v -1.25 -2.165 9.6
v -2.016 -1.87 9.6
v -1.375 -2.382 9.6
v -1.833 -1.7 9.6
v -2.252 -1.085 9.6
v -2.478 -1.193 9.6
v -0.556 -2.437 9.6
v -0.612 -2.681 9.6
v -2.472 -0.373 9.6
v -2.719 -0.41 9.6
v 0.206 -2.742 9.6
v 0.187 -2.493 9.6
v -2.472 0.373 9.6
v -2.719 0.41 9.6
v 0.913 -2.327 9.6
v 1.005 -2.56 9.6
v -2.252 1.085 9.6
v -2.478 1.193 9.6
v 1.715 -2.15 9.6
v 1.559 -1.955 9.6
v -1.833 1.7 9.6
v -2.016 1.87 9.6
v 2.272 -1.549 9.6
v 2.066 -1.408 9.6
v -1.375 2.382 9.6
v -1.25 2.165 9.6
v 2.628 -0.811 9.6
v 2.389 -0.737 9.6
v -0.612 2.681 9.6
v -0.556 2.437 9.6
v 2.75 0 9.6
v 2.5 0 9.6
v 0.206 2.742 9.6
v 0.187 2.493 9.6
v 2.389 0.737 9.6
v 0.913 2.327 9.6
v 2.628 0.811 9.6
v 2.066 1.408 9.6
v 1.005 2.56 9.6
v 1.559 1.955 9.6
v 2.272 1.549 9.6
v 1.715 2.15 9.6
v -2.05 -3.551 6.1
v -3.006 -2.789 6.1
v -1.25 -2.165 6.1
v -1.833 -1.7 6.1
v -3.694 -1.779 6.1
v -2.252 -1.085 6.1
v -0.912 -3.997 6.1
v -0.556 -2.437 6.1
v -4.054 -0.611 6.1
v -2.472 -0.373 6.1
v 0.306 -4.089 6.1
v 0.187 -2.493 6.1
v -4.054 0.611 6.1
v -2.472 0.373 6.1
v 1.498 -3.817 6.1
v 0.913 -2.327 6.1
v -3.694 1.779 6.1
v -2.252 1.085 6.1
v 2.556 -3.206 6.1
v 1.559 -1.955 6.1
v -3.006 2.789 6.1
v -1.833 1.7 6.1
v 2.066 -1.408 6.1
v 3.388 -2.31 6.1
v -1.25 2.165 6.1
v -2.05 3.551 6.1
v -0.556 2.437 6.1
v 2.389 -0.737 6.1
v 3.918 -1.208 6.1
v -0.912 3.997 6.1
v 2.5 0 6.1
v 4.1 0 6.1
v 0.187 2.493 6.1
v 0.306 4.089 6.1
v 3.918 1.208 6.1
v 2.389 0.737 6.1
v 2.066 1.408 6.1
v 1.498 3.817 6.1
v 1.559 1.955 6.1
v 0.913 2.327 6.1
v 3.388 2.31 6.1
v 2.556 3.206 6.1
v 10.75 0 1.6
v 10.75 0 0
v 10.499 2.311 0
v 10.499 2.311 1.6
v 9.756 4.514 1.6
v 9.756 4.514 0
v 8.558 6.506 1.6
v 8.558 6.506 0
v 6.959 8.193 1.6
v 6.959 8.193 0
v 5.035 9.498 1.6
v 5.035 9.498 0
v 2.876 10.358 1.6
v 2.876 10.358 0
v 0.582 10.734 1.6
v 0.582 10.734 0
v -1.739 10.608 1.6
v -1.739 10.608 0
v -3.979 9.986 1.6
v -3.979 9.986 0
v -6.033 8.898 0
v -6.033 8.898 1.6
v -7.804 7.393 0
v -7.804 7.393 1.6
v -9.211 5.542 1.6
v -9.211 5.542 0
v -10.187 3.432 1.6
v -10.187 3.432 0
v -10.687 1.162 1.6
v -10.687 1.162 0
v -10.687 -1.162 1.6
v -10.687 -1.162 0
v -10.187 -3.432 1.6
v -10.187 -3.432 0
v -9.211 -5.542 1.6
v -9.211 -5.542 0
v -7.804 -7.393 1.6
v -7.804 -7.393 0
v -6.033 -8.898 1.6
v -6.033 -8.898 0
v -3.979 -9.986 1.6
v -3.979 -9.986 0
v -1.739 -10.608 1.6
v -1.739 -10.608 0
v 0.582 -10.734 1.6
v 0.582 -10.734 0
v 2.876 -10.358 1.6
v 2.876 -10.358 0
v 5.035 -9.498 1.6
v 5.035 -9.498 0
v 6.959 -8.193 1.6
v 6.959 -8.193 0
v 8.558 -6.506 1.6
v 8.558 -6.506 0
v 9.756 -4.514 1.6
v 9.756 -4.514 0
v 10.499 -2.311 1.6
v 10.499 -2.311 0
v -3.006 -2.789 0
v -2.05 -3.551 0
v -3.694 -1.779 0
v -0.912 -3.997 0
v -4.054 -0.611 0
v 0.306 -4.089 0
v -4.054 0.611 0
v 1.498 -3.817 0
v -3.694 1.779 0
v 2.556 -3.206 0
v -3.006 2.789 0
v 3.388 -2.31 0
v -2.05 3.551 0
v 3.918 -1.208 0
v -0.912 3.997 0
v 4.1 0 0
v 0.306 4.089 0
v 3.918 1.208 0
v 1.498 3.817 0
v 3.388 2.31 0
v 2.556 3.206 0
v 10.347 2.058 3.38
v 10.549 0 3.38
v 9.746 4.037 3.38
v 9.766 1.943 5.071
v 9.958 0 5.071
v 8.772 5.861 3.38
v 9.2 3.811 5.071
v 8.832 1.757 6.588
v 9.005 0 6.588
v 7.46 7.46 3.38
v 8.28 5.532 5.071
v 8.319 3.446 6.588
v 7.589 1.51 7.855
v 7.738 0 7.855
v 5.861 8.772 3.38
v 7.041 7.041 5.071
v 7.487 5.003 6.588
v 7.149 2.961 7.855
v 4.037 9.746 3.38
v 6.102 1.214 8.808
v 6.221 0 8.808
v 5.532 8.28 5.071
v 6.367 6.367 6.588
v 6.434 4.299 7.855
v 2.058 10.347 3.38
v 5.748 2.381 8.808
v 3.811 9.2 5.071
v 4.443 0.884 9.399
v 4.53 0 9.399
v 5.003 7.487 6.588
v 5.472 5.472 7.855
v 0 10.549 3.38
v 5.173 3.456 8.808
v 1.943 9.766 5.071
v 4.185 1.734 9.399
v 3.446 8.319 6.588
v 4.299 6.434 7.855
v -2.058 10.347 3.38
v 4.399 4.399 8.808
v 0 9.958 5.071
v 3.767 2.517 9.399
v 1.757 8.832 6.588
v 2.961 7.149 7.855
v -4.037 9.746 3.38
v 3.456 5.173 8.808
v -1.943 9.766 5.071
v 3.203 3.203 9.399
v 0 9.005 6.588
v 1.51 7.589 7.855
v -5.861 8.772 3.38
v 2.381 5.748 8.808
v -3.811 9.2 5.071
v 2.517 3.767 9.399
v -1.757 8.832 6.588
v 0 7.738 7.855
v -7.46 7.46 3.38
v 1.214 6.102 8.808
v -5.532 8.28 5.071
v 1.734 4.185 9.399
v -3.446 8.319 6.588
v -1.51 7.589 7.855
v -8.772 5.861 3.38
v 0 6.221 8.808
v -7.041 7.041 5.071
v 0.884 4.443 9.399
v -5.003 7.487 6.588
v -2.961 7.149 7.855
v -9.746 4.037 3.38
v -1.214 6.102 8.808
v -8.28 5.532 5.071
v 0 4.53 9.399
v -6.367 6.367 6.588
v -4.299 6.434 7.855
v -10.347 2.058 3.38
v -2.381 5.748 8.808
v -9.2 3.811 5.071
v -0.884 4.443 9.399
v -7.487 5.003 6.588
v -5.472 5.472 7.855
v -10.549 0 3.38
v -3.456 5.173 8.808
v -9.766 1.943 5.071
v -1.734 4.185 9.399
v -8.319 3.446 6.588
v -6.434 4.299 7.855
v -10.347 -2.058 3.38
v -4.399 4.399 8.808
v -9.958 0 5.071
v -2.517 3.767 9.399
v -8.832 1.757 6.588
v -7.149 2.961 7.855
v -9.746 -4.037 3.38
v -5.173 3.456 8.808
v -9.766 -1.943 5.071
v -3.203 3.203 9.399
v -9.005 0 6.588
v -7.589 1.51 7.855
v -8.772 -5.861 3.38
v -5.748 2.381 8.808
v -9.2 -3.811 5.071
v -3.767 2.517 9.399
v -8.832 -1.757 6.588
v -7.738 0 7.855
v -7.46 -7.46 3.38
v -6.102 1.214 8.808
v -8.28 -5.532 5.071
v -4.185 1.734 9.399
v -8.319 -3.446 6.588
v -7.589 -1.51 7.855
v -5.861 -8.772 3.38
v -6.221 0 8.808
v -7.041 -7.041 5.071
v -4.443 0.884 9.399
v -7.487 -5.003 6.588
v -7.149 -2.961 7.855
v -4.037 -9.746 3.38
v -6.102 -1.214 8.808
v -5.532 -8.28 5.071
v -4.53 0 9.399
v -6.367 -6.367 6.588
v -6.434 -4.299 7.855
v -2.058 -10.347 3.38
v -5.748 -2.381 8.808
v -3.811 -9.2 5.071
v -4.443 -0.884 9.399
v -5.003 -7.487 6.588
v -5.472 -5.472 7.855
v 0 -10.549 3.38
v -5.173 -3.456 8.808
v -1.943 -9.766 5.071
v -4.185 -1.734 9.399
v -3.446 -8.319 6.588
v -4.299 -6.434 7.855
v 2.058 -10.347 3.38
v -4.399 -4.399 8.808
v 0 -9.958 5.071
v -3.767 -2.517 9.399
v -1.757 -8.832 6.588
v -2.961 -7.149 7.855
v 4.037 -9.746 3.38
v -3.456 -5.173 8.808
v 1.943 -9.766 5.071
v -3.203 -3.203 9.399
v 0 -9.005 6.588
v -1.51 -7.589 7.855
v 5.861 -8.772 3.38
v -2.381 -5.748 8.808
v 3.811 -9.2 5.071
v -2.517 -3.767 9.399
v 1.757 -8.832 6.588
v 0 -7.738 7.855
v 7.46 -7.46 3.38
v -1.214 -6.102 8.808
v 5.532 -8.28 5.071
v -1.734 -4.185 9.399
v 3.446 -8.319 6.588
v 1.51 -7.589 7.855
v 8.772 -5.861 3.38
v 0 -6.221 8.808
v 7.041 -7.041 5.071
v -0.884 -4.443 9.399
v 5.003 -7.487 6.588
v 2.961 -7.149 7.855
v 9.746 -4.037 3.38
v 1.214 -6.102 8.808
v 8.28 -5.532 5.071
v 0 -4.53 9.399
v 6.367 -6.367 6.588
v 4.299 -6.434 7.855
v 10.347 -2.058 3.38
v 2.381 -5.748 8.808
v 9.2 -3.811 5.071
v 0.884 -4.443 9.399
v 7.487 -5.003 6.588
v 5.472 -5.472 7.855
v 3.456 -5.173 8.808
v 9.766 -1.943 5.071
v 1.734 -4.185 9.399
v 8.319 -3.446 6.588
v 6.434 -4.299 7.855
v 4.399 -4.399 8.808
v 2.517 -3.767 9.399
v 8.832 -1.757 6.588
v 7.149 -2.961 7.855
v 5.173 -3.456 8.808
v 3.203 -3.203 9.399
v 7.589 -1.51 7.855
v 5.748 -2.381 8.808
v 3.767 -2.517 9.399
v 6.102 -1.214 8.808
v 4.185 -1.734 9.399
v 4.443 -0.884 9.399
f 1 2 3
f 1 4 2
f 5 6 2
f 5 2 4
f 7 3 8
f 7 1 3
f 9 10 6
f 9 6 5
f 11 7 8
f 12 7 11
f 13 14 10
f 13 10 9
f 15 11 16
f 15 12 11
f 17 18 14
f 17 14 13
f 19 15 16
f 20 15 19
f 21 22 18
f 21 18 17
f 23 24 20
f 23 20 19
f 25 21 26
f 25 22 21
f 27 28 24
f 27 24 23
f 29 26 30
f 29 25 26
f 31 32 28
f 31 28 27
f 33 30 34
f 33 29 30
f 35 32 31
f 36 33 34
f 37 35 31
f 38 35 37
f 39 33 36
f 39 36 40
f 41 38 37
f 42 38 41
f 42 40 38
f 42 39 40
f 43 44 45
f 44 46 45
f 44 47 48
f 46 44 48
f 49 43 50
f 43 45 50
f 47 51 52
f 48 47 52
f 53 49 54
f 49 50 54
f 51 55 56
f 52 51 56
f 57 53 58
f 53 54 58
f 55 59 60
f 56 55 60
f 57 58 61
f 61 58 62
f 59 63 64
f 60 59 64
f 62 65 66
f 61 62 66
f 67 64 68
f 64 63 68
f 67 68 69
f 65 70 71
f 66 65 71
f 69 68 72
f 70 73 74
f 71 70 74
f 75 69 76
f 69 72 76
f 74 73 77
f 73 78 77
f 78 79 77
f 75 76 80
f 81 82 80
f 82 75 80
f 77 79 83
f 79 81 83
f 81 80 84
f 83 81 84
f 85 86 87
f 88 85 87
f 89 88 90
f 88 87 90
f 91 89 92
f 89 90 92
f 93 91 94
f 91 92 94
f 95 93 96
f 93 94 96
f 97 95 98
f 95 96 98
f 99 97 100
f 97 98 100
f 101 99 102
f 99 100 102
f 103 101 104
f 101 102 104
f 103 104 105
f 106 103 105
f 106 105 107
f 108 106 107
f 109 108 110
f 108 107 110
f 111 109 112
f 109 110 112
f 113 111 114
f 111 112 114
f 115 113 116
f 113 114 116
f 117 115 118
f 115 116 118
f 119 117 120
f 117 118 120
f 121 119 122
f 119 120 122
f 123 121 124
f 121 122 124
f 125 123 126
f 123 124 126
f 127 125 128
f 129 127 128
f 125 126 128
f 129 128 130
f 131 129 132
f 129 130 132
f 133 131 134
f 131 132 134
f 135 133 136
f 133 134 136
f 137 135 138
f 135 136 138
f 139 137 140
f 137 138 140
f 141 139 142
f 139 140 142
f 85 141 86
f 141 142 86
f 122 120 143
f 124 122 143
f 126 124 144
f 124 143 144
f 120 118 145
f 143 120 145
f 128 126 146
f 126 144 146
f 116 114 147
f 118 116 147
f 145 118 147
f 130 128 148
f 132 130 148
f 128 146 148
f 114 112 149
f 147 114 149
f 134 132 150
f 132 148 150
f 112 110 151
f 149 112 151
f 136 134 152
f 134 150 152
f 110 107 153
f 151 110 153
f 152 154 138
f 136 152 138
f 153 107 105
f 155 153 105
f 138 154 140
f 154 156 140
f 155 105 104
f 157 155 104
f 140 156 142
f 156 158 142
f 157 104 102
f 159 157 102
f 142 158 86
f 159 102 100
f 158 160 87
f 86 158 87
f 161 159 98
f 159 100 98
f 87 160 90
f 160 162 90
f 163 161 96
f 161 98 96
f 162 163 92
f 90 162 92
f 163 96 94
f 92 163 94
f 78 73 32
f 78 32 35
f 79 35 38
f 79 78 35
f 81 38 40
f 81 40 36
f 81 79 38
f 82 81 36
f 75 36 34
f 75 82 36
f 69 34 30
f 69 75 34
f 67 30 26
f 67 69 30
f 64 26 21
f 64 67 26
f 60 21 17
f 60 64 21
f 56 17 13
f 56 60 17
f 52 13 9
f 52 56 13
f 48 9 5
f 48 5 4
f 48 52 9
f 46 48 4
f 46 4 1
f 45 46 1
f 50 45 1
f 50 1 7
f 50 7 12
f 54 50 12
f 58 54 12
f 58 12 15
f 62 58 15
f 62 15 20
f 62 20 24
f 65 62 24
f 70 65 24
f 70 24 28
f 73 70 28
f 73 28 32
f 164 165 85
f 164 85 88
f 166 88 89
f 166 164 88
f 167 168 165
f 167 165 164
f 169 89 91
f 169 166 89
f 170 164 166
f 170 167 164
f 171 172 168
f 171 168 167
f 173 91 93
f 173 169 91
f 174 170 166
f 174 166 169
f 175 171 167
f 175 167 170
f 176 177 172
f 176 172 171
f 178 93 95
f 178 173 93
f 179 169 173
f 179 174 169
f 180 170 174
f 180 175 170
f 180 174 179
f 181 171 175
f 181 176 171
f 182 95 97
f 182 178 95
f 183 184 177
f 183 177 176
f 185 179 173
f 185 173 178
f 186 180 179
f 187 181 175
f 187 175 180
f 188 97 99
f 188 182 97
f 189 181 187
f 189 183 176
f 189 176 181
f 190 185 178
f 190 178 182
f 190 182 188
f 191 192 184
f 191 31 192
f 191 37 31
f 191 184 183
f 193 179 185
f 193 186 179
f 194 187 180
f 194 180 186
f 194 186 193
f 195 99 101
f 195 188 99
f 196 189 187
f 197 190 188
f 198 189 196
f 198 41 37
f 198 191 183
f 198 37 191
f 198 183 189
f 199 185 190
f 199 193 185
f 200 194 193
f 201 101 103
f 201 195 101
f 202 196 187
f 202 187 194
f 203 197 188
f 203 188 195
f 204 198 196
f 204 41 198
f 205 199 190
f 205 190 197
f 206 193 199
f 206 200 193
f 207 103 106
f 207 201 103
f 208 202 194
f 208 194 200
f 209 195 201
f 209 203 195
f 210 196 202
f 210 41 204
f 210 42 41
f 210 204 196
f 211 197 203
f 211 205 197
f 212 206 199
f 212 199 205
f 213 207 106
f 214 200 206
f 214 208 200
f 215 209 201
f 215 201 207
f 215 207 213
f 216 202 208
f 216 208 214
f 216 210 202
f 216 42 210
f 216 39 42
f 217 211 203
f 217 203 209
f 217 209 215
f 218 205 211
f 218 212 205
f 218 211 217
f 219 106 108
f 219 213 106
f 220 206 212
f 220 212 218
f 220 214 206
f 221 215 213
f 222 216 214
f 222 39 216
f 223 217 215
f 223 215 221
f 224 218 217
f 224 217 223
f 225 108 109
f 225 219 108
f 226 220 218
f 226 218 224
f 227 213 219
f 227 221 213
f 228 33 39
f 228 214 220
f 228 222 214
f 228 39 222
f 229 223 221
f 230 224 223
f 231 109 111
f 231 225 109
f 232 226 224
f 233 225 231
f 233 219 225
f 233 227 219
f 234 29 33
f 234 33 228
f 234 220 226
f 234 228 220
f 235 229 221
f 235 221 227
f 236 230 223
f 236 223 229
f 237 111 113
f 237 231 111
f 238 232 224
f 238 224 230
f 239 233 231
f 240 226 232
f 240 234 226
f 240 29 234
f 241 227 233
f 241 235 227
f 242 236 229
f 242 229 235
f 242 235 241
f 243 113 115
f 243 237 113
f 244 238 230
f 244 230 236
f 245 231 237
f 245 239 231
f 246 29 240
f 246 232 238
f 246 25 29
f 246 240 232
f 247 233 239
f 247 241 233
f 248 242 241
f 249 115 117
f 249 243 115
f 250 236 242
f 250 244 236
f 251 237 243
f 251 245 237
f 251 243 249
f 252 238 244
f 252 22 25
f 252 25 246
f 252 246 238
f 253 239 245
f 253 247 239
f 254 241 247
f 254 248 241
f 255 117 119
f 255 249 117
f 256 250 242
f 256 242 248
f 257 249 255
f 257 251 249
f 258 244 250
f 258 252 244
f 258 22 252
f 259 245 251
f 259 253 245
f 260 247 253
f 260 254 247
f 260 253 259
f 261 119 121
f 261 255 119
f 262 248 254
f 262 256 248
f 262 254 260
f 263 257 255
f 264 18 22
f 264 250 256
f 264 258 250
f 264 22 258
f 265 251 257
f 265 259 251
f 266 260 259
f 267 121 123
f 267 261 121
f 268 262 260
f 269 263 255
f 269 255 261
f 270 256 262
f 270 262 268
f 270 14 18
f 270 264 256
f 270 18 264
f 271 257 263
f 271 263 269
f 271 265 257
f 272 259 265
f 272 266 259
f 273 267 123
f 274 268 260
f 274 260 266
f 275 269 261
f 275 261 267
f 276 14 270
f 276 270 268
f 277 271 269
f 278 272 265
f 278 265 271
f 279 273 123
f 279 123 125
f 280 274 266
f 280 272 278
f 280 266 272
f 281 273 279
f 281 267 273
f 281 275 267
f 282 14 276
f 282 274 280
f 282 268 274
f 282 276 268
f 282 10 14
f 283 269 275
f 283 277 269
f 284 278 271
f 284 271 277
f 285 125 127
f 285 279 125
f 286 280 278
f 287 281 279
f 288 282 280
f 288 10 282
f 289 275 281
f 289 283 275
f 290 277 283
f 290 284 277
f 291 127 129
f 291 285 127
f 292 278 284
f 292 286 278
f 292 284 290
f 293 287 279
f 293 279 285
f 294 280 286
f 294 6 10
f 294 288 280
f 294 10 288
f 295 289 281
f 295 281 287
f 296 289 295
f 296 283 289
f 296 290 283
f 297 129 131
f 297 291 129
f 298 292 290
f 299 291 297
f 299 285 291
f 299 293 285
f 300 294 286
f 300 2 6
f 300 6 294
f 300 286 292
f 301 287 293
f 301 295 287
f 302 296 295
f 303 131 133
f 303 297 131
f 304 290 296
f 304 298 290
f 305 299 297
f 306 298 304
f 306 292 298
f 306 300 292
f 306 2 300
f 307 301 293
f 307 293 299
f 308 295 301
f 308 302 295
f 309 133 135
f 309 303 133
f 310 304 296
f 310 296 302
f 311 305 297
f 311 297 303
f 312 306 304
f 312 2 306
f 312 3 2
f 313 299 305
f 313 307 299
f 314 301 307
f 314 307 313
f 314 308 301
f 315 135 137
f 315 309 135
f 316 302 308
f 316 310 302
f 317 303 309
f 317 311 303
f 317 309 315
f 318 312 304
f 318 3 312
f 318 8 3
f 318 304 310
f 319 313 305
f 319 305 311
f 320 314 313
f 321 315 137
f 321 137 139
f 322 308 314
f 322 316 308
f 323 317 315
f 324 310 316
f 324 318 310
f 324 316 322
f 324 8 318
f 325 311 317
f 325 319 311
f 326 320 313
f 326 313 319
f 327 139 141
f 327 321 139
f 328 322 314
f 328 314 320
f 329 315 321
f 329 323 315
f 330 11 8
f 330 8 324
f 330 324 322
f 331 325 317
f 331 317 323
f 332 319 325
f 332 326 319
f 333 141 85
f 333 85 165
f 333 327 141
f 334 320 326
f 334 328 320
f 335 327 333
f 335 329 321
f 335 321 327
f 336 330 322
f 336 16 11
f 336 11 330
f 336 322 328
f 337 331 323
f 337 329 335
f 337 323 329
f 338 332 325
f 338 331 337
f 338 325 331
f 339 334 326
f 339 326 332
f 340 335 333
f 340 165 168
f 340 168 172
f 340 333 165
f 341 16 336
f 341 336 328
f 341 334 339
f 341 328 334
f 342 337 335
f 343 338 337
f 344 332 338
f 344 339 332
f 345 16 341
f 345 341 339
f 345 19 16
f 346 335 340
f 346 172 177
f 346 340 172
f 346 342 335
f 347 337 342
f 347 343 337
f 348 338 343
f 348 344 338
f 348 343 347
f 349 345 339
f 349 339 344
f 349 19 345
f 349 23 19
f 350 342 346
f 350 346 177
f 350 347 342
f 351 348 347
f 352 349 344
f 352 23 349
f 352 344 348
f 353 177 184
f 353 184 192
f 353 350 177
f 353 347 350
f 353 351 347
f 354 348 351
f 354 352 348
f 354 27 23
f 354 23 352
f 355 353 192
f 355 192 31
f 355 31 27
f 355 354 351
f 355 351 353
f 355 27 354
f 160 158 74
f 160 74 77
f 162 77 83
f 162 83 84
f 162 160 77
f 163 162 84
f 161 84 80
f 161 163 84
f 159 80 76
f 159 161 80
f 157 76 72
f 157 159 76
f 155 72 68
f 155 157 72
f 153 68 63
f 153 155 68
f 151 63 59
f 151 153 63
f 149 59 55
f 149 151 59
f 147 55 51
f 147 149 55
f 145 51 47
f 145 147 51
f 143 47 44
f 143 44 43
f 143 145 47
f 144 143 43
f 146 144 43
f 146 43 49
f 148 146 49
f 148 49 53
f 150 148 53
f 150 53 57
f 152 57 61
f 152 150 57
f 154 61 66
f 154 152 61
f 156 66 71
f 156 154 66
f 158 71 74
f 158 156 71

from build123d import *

# Parameters (mm, degrees)
F0_R          = 10.75
F0_R_2        = 4.1
F0_R_3        = 2.5
F1_DEPTH      = 9.6
F2_R          = 8
F3_DEPTH      = 25
F4_DEPTH      = 6.1
F4_DEPTH_BACK = 13.5


with BuildPart() as f1:
    # F0 (on Top) → F1 (new body)
    with BuildSketch(Plane.XY):
        Circle(F0_R)
        Circle(F0_R_2, mode=Mode.SUBTRACT)
        Circle(F0_R_2)
        Circle(F0_R_3, mode=Mode.SUBTRACT)
    extrude(amount=F1_DEPTH)

    # F2
    f2_edges = [f1.edges().sort_by_distance(p)[0] for p in [
        (-10.75, 0, 9.6),
    ]]
    fillet(f2_edges, radius=F2_R)

    # F0 (on Top) → F3 (cut)
    with BuildSketch(Plane.XY):
        Circle(F0_R_3)
    extrude(amount=-F3_DEPTH, mode=Mode.SUBTRACT)

    # F0 (on Top) → F4 (cut, two sides)
    with BuildSketch(Plane.XY) as f4_sk:
        Circle(F0_R_2)
        Circle(F0_R_3, mode=Mode.SUBTRACT)
    extrude(amount=F4_DEPTH, mode=Mode.SUBTRACT)
    extrude(f4_sk.sketch, amount=-F4_DEPTH_BACK, mode=Mode.SUBTRACT)


solid = f1.part
